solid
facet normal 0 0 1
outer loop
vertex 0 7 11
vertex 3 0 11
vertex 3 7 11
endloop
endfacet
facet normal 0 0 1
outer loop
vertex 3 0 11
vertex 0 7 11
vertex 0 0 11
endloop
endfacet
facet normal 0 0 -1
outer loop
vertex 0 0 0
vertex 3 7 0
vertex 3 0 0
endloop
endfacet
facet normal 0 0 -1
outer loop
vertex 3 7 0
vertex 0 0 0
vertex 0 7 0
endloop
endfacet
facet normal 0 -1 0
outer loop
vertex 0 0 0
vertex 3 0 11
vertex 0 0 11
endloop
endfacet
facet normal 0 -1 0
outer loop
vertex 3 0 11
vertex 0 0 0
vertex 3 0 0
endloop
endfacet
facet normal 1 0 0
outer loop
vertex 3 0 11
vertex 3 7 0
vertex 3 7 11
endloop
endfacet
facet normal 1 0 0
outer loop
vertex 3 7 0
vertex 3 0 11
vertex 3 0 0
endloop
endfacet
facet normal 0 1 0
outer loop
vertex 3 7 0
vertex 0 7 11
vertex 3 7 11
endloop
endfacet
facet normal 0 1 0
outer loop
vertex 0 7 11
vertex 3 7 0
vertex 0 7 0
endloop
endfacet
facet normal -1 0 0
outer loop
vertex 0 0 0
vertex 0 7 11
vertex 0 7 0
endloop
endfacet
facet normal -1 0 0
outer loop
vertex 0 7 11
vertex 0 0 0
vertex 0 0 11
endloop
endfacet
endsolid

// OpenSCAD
// Generated by SolidPython 1.0.1 on 2020-07-29 00:46:54


cube(size = [3, 7, 11]);
/***********************************************
*********      SolidPython code:      **********
************************************************
 
# import packages: SolidPython
from solid import *
from solid.utils import *
from itertools import chain, combinations, permutations


class Resize:

    def __init__(self, scad_file):
        self.scad_file = scad_file
        #self.scad_file = import_scad(scad_file)
        # cone/cylinder param:
        self.r1 = 0
        self.r2 = 0
        self.h = 0
        # rectangular prism param:
        self.w = 0
        self.l = 0
        # ellipse param:
        self.r = 0

    # import OpenScad code (file name corresponds to shape)


    # classify shape + parameters
    def assign(self, param1, param2, param3):
        if self.scad_file == 'cone.scad':
            self.r1 = param1
            self.r2 = param2
            self.h = param3
        elif self.scad_file == 'cylinder.scad':
            self.r1 = param1
            self.r2 = param2
            self.h = param3
        elif self.scad_file == 'rectangularPrism.scad':
            self.h = param1
            self.l = param2
            self.w = param3
        else:
            self.r = param1
            self.h = param2

    # resize parameters
    def iterate(self):
        x = range(3, 20, 2)
        i = 1
        if self.scad_file == 'cone.scad':
            tempList = list(permutations(x, 2))
            for temp in tempList:
                param1 = temp[0]
                param2 = temp[1]
                filepath = 'produced_scad_files/' + 'cone' + str(param1) + '_' + str(param2) + '_' + '.scad'
                scad_render_to_file(cylinder(h=param1, r1=param2, r2=0), filepath)

        elif self.scad_file == 'cylinder.scad':
            tempList = list(permutations(x, 3))
            for temp in tempList:
                param1 = temp[0]
                param2 = temp[1]
                filepath = 'produced_scad_files/' + 'cylinder' + str(param1) + '_' + str(param2) + '_' + '.scad'
                scad_render_to_file(cylinder(h=param1, r1=param2, r2=param2), filepath)

        elif self.scad_file == 'rectangularPrism.scad':
            tempList = list(permutations(x, 3))
            for temp in tempList:
                param1 = temp[0]
                param2 = temp[1]
                param3 = temp[2]
                filepath = 'produced_scad_files/' + 'rectangularPrism' + str(param1) + '_' + str(param2) + '_' + str(
                    param3) + '.scad'
                scad_render_to_file(cube(size=(param1, param2, param3)), filepath)

        elif self.scad_file == 'ellipse.scad':
            tempList = list(permutations(x, 4))
            for temp in tempList:
                param1 = temp[0]
                param2 = temp[1]
                param3 = temp[2]
                param4 = temp[3]
                filepath = 'produced_scad_files/' + 'ellipse' + str(param1) + '_' + str(param2) + '_' + str(param3) + '_' + str(param4) + '.scad'
                scad_render_to_file(scale([param1, param2, param3])(sphere(r=param4)), filepath)

    def render_to_scadfile(self):
        scad_render_to_file(scad, 'example.scad') 
 
************************************************/
